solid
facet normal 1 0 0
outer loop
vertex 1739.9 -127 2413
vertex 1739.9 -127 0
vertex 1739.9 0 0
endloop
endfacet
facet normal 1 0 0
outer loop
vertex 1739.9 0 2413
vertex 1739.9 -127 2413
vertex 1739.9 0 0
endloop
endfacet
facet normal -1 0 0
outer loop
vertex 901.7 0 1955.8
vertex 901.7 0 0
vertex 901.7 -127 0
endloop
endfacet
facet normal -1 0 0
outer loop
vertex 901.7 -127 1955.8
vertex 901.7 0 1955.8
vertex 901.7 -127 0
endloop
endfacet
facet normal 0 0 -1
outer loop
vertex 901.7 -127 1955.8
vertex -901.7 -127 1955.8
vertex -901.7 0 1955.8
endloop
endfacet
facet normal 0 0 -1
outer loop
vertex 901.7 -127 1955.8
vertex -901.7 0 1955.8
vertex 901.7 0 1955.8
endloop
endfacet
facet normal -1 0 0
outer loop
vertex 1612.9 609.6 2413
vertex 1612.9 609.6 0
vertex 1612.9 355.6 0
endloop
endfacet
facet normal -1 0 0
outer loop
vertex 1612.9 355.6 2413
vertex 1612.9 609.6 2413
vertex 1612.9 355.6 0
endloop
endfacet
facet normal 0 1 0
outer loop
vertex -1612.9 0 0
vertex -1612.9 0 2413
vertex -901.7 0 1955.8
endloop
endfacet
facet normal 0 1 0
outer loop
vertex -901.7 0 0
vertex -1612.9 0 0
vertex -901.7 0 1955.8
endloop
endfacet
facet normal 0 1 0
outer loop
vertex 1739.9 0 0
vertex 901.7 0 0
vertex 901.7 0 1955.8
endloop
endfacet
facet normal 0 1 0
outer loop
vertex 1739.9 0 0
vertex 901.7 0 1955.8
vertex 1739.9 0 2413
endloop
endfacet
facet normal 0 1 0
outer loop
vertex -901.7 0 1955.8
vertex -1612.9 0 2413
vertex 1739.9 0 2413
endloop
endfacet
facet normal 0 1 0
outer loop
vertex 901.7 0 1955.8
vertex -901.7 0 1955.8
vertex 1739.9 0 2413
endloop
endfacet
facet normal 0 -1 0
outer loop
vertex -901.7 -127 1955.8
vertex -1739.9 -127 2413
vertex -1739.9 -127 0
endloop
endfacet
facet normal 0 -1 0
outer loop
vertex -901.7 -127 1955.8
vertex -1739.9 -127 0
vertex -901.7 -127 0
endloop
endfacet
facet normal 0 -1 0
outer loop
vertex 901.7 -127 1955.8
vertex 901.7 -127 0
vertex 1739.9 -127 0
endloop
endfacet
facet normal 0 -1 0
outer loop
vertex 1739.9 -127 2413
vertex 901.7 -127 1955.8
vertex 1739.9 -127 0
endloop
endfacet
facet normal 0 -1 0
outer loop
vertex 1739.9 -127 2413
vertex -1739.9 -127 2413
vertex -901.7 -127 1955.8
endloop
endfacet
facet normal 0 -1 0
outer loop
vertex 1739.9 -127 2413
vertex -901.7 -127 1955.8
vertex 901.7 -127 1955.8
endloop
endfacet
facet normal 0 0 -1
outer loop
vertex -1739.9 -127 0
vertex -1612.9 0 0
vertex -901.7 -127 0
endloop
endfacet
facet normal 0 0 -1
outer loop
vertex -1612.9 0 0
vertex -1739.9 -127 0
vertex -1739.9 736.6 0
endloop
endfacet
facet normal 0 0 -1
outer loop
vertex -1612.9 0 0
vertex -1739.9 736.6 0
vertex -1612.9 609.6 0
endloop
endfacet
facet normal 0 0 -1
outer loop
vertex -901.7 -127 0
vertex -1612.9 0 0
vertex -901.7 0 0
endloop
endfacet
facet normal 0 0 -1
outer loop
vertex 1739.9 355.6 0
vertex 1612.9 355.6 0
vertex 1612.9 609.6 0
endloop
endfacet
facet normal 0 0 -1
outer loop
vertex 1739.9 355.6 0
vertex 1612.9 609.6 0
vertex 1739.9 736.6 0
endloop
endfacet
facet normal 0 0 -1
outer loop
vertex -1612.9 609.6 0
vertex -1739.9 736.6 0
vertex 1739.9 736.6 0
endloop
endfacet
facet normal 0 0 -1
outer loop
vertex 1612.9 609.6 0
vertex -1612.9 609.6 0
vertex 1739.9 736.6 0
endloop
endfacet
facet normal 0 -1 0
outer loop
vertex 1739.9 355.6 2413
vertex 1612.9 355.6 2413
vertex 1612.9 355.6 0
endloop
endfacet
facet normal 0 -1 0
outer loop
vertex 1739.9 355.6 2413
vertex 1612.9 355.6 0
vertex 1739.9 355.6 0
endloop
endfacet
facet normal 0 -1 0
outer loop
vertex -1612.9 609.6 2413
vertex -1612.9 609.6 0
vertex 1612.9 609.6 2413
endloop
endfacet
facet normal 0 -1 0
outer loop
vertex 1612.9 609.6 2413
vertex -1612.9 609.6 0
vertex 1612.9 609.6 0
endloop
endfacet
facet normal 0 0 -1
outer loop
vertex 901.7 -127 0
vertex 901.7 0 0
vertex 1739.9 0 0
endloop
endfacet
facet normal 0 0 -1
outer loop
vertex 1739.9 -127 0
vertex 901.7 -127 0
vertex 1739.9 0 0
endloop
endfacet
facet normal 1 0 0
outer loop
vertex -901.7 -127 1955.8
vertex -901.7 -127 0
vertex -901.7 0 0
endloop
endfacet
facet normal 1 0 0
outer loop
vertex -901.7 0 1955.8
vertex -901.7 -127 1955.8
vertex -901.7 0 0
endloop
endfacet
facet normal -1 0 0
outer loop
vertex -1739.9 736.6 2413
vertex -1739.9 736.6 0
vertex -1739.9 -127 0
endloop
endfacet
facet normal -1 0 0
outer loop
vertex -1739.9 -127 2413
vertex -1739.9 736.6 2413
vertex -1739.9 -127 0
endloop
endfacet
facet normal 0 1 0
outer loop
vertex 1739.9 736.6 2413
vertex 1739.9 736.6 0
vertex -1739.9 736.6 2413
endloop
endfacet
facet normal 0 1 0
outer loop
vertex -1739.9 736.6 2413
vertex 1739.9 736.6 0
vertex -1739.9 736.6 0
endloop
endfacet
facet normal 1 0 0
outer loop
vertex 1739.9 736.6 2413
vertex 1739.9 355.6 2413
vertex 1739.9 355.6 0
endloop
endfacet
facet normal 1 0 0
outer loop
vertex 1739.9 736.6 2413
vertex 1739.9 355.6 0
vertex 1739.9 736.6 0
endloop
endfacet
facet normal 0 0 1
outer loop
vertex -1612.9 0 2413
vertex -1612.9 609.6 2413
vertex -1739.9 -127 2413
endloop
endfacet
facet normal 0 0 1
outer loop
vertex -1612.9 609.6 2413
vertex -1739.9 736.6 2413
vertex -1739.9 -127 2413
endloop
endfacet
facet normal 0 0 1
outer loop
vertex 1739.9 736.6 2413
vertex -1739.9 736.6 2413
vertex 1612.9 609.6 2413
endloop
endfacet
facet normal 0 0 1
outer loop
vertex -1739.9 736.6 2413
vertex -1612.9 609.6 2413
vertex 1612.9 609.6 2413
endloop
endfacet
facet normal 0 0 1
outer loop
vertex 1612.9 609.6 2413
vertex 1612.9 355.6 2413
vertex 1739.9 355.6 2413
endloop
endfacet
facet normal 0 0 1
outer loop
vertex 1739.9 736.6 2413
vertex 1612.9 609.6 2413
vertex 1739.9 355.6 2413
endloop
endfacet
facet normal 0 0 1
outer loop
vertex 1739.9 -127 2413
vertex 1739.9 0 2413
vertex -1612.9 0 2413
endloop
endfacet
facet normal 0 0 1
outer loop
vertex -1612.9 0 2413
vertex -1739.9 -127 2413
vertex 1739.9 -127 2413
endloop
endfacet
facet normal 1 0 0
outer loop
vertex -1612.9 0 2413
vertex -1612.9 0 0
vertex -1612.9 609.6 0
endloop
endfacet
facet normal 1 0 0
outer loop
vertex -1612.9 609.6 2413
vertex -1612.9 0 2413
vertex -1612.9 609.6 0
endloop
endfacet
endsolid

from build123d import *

# Parameters (mm, degrees)
F1_DEPTH = 2413
F2_W     = 1803.4
F2_H     = 457.2
F3_DEPTH = 127
F4_W     = 127
F4_H     = 355.6
F5_DEPTH = 2413.001


with BuildPart() as f1:
    # F0 (on Top) → F1 (new body)
    with BuildSketch(Plane.XY):
        Polygon((-1739.9, 736.6), (-1739.9, -127), (-901.7, -127), (-901.7, 0), (-1612.9, 0), (-1612.9, 609.6), (1612.9, 609.6), (1612.9, 0), (901.7, 0), (901.7, -127), (1739.9, -127), (1739.9, 736.6), align=None)
    extrude(amount=F1_DEPTH)

    # F2 (on face) → F3 (join, through all)
    with BuildSketch(Plane.XZ.offset(127)):
        with Locations((0, 2184.4)):
            Rectangle(F2_W, F2_H)
    extrude(amount=-F3_DEPTH)

    # F4 (on face) → F5 (cut, through all)
    with BuildSketch(Plane.XY.offset(2413)):
        with Locations((1676.4, 177.8)):
            Rectangle(F4_W, F4_H)
    extrude(amount=-F5_DEPTH, mode=Mode.SUBTRACT)


solid = f1.part
